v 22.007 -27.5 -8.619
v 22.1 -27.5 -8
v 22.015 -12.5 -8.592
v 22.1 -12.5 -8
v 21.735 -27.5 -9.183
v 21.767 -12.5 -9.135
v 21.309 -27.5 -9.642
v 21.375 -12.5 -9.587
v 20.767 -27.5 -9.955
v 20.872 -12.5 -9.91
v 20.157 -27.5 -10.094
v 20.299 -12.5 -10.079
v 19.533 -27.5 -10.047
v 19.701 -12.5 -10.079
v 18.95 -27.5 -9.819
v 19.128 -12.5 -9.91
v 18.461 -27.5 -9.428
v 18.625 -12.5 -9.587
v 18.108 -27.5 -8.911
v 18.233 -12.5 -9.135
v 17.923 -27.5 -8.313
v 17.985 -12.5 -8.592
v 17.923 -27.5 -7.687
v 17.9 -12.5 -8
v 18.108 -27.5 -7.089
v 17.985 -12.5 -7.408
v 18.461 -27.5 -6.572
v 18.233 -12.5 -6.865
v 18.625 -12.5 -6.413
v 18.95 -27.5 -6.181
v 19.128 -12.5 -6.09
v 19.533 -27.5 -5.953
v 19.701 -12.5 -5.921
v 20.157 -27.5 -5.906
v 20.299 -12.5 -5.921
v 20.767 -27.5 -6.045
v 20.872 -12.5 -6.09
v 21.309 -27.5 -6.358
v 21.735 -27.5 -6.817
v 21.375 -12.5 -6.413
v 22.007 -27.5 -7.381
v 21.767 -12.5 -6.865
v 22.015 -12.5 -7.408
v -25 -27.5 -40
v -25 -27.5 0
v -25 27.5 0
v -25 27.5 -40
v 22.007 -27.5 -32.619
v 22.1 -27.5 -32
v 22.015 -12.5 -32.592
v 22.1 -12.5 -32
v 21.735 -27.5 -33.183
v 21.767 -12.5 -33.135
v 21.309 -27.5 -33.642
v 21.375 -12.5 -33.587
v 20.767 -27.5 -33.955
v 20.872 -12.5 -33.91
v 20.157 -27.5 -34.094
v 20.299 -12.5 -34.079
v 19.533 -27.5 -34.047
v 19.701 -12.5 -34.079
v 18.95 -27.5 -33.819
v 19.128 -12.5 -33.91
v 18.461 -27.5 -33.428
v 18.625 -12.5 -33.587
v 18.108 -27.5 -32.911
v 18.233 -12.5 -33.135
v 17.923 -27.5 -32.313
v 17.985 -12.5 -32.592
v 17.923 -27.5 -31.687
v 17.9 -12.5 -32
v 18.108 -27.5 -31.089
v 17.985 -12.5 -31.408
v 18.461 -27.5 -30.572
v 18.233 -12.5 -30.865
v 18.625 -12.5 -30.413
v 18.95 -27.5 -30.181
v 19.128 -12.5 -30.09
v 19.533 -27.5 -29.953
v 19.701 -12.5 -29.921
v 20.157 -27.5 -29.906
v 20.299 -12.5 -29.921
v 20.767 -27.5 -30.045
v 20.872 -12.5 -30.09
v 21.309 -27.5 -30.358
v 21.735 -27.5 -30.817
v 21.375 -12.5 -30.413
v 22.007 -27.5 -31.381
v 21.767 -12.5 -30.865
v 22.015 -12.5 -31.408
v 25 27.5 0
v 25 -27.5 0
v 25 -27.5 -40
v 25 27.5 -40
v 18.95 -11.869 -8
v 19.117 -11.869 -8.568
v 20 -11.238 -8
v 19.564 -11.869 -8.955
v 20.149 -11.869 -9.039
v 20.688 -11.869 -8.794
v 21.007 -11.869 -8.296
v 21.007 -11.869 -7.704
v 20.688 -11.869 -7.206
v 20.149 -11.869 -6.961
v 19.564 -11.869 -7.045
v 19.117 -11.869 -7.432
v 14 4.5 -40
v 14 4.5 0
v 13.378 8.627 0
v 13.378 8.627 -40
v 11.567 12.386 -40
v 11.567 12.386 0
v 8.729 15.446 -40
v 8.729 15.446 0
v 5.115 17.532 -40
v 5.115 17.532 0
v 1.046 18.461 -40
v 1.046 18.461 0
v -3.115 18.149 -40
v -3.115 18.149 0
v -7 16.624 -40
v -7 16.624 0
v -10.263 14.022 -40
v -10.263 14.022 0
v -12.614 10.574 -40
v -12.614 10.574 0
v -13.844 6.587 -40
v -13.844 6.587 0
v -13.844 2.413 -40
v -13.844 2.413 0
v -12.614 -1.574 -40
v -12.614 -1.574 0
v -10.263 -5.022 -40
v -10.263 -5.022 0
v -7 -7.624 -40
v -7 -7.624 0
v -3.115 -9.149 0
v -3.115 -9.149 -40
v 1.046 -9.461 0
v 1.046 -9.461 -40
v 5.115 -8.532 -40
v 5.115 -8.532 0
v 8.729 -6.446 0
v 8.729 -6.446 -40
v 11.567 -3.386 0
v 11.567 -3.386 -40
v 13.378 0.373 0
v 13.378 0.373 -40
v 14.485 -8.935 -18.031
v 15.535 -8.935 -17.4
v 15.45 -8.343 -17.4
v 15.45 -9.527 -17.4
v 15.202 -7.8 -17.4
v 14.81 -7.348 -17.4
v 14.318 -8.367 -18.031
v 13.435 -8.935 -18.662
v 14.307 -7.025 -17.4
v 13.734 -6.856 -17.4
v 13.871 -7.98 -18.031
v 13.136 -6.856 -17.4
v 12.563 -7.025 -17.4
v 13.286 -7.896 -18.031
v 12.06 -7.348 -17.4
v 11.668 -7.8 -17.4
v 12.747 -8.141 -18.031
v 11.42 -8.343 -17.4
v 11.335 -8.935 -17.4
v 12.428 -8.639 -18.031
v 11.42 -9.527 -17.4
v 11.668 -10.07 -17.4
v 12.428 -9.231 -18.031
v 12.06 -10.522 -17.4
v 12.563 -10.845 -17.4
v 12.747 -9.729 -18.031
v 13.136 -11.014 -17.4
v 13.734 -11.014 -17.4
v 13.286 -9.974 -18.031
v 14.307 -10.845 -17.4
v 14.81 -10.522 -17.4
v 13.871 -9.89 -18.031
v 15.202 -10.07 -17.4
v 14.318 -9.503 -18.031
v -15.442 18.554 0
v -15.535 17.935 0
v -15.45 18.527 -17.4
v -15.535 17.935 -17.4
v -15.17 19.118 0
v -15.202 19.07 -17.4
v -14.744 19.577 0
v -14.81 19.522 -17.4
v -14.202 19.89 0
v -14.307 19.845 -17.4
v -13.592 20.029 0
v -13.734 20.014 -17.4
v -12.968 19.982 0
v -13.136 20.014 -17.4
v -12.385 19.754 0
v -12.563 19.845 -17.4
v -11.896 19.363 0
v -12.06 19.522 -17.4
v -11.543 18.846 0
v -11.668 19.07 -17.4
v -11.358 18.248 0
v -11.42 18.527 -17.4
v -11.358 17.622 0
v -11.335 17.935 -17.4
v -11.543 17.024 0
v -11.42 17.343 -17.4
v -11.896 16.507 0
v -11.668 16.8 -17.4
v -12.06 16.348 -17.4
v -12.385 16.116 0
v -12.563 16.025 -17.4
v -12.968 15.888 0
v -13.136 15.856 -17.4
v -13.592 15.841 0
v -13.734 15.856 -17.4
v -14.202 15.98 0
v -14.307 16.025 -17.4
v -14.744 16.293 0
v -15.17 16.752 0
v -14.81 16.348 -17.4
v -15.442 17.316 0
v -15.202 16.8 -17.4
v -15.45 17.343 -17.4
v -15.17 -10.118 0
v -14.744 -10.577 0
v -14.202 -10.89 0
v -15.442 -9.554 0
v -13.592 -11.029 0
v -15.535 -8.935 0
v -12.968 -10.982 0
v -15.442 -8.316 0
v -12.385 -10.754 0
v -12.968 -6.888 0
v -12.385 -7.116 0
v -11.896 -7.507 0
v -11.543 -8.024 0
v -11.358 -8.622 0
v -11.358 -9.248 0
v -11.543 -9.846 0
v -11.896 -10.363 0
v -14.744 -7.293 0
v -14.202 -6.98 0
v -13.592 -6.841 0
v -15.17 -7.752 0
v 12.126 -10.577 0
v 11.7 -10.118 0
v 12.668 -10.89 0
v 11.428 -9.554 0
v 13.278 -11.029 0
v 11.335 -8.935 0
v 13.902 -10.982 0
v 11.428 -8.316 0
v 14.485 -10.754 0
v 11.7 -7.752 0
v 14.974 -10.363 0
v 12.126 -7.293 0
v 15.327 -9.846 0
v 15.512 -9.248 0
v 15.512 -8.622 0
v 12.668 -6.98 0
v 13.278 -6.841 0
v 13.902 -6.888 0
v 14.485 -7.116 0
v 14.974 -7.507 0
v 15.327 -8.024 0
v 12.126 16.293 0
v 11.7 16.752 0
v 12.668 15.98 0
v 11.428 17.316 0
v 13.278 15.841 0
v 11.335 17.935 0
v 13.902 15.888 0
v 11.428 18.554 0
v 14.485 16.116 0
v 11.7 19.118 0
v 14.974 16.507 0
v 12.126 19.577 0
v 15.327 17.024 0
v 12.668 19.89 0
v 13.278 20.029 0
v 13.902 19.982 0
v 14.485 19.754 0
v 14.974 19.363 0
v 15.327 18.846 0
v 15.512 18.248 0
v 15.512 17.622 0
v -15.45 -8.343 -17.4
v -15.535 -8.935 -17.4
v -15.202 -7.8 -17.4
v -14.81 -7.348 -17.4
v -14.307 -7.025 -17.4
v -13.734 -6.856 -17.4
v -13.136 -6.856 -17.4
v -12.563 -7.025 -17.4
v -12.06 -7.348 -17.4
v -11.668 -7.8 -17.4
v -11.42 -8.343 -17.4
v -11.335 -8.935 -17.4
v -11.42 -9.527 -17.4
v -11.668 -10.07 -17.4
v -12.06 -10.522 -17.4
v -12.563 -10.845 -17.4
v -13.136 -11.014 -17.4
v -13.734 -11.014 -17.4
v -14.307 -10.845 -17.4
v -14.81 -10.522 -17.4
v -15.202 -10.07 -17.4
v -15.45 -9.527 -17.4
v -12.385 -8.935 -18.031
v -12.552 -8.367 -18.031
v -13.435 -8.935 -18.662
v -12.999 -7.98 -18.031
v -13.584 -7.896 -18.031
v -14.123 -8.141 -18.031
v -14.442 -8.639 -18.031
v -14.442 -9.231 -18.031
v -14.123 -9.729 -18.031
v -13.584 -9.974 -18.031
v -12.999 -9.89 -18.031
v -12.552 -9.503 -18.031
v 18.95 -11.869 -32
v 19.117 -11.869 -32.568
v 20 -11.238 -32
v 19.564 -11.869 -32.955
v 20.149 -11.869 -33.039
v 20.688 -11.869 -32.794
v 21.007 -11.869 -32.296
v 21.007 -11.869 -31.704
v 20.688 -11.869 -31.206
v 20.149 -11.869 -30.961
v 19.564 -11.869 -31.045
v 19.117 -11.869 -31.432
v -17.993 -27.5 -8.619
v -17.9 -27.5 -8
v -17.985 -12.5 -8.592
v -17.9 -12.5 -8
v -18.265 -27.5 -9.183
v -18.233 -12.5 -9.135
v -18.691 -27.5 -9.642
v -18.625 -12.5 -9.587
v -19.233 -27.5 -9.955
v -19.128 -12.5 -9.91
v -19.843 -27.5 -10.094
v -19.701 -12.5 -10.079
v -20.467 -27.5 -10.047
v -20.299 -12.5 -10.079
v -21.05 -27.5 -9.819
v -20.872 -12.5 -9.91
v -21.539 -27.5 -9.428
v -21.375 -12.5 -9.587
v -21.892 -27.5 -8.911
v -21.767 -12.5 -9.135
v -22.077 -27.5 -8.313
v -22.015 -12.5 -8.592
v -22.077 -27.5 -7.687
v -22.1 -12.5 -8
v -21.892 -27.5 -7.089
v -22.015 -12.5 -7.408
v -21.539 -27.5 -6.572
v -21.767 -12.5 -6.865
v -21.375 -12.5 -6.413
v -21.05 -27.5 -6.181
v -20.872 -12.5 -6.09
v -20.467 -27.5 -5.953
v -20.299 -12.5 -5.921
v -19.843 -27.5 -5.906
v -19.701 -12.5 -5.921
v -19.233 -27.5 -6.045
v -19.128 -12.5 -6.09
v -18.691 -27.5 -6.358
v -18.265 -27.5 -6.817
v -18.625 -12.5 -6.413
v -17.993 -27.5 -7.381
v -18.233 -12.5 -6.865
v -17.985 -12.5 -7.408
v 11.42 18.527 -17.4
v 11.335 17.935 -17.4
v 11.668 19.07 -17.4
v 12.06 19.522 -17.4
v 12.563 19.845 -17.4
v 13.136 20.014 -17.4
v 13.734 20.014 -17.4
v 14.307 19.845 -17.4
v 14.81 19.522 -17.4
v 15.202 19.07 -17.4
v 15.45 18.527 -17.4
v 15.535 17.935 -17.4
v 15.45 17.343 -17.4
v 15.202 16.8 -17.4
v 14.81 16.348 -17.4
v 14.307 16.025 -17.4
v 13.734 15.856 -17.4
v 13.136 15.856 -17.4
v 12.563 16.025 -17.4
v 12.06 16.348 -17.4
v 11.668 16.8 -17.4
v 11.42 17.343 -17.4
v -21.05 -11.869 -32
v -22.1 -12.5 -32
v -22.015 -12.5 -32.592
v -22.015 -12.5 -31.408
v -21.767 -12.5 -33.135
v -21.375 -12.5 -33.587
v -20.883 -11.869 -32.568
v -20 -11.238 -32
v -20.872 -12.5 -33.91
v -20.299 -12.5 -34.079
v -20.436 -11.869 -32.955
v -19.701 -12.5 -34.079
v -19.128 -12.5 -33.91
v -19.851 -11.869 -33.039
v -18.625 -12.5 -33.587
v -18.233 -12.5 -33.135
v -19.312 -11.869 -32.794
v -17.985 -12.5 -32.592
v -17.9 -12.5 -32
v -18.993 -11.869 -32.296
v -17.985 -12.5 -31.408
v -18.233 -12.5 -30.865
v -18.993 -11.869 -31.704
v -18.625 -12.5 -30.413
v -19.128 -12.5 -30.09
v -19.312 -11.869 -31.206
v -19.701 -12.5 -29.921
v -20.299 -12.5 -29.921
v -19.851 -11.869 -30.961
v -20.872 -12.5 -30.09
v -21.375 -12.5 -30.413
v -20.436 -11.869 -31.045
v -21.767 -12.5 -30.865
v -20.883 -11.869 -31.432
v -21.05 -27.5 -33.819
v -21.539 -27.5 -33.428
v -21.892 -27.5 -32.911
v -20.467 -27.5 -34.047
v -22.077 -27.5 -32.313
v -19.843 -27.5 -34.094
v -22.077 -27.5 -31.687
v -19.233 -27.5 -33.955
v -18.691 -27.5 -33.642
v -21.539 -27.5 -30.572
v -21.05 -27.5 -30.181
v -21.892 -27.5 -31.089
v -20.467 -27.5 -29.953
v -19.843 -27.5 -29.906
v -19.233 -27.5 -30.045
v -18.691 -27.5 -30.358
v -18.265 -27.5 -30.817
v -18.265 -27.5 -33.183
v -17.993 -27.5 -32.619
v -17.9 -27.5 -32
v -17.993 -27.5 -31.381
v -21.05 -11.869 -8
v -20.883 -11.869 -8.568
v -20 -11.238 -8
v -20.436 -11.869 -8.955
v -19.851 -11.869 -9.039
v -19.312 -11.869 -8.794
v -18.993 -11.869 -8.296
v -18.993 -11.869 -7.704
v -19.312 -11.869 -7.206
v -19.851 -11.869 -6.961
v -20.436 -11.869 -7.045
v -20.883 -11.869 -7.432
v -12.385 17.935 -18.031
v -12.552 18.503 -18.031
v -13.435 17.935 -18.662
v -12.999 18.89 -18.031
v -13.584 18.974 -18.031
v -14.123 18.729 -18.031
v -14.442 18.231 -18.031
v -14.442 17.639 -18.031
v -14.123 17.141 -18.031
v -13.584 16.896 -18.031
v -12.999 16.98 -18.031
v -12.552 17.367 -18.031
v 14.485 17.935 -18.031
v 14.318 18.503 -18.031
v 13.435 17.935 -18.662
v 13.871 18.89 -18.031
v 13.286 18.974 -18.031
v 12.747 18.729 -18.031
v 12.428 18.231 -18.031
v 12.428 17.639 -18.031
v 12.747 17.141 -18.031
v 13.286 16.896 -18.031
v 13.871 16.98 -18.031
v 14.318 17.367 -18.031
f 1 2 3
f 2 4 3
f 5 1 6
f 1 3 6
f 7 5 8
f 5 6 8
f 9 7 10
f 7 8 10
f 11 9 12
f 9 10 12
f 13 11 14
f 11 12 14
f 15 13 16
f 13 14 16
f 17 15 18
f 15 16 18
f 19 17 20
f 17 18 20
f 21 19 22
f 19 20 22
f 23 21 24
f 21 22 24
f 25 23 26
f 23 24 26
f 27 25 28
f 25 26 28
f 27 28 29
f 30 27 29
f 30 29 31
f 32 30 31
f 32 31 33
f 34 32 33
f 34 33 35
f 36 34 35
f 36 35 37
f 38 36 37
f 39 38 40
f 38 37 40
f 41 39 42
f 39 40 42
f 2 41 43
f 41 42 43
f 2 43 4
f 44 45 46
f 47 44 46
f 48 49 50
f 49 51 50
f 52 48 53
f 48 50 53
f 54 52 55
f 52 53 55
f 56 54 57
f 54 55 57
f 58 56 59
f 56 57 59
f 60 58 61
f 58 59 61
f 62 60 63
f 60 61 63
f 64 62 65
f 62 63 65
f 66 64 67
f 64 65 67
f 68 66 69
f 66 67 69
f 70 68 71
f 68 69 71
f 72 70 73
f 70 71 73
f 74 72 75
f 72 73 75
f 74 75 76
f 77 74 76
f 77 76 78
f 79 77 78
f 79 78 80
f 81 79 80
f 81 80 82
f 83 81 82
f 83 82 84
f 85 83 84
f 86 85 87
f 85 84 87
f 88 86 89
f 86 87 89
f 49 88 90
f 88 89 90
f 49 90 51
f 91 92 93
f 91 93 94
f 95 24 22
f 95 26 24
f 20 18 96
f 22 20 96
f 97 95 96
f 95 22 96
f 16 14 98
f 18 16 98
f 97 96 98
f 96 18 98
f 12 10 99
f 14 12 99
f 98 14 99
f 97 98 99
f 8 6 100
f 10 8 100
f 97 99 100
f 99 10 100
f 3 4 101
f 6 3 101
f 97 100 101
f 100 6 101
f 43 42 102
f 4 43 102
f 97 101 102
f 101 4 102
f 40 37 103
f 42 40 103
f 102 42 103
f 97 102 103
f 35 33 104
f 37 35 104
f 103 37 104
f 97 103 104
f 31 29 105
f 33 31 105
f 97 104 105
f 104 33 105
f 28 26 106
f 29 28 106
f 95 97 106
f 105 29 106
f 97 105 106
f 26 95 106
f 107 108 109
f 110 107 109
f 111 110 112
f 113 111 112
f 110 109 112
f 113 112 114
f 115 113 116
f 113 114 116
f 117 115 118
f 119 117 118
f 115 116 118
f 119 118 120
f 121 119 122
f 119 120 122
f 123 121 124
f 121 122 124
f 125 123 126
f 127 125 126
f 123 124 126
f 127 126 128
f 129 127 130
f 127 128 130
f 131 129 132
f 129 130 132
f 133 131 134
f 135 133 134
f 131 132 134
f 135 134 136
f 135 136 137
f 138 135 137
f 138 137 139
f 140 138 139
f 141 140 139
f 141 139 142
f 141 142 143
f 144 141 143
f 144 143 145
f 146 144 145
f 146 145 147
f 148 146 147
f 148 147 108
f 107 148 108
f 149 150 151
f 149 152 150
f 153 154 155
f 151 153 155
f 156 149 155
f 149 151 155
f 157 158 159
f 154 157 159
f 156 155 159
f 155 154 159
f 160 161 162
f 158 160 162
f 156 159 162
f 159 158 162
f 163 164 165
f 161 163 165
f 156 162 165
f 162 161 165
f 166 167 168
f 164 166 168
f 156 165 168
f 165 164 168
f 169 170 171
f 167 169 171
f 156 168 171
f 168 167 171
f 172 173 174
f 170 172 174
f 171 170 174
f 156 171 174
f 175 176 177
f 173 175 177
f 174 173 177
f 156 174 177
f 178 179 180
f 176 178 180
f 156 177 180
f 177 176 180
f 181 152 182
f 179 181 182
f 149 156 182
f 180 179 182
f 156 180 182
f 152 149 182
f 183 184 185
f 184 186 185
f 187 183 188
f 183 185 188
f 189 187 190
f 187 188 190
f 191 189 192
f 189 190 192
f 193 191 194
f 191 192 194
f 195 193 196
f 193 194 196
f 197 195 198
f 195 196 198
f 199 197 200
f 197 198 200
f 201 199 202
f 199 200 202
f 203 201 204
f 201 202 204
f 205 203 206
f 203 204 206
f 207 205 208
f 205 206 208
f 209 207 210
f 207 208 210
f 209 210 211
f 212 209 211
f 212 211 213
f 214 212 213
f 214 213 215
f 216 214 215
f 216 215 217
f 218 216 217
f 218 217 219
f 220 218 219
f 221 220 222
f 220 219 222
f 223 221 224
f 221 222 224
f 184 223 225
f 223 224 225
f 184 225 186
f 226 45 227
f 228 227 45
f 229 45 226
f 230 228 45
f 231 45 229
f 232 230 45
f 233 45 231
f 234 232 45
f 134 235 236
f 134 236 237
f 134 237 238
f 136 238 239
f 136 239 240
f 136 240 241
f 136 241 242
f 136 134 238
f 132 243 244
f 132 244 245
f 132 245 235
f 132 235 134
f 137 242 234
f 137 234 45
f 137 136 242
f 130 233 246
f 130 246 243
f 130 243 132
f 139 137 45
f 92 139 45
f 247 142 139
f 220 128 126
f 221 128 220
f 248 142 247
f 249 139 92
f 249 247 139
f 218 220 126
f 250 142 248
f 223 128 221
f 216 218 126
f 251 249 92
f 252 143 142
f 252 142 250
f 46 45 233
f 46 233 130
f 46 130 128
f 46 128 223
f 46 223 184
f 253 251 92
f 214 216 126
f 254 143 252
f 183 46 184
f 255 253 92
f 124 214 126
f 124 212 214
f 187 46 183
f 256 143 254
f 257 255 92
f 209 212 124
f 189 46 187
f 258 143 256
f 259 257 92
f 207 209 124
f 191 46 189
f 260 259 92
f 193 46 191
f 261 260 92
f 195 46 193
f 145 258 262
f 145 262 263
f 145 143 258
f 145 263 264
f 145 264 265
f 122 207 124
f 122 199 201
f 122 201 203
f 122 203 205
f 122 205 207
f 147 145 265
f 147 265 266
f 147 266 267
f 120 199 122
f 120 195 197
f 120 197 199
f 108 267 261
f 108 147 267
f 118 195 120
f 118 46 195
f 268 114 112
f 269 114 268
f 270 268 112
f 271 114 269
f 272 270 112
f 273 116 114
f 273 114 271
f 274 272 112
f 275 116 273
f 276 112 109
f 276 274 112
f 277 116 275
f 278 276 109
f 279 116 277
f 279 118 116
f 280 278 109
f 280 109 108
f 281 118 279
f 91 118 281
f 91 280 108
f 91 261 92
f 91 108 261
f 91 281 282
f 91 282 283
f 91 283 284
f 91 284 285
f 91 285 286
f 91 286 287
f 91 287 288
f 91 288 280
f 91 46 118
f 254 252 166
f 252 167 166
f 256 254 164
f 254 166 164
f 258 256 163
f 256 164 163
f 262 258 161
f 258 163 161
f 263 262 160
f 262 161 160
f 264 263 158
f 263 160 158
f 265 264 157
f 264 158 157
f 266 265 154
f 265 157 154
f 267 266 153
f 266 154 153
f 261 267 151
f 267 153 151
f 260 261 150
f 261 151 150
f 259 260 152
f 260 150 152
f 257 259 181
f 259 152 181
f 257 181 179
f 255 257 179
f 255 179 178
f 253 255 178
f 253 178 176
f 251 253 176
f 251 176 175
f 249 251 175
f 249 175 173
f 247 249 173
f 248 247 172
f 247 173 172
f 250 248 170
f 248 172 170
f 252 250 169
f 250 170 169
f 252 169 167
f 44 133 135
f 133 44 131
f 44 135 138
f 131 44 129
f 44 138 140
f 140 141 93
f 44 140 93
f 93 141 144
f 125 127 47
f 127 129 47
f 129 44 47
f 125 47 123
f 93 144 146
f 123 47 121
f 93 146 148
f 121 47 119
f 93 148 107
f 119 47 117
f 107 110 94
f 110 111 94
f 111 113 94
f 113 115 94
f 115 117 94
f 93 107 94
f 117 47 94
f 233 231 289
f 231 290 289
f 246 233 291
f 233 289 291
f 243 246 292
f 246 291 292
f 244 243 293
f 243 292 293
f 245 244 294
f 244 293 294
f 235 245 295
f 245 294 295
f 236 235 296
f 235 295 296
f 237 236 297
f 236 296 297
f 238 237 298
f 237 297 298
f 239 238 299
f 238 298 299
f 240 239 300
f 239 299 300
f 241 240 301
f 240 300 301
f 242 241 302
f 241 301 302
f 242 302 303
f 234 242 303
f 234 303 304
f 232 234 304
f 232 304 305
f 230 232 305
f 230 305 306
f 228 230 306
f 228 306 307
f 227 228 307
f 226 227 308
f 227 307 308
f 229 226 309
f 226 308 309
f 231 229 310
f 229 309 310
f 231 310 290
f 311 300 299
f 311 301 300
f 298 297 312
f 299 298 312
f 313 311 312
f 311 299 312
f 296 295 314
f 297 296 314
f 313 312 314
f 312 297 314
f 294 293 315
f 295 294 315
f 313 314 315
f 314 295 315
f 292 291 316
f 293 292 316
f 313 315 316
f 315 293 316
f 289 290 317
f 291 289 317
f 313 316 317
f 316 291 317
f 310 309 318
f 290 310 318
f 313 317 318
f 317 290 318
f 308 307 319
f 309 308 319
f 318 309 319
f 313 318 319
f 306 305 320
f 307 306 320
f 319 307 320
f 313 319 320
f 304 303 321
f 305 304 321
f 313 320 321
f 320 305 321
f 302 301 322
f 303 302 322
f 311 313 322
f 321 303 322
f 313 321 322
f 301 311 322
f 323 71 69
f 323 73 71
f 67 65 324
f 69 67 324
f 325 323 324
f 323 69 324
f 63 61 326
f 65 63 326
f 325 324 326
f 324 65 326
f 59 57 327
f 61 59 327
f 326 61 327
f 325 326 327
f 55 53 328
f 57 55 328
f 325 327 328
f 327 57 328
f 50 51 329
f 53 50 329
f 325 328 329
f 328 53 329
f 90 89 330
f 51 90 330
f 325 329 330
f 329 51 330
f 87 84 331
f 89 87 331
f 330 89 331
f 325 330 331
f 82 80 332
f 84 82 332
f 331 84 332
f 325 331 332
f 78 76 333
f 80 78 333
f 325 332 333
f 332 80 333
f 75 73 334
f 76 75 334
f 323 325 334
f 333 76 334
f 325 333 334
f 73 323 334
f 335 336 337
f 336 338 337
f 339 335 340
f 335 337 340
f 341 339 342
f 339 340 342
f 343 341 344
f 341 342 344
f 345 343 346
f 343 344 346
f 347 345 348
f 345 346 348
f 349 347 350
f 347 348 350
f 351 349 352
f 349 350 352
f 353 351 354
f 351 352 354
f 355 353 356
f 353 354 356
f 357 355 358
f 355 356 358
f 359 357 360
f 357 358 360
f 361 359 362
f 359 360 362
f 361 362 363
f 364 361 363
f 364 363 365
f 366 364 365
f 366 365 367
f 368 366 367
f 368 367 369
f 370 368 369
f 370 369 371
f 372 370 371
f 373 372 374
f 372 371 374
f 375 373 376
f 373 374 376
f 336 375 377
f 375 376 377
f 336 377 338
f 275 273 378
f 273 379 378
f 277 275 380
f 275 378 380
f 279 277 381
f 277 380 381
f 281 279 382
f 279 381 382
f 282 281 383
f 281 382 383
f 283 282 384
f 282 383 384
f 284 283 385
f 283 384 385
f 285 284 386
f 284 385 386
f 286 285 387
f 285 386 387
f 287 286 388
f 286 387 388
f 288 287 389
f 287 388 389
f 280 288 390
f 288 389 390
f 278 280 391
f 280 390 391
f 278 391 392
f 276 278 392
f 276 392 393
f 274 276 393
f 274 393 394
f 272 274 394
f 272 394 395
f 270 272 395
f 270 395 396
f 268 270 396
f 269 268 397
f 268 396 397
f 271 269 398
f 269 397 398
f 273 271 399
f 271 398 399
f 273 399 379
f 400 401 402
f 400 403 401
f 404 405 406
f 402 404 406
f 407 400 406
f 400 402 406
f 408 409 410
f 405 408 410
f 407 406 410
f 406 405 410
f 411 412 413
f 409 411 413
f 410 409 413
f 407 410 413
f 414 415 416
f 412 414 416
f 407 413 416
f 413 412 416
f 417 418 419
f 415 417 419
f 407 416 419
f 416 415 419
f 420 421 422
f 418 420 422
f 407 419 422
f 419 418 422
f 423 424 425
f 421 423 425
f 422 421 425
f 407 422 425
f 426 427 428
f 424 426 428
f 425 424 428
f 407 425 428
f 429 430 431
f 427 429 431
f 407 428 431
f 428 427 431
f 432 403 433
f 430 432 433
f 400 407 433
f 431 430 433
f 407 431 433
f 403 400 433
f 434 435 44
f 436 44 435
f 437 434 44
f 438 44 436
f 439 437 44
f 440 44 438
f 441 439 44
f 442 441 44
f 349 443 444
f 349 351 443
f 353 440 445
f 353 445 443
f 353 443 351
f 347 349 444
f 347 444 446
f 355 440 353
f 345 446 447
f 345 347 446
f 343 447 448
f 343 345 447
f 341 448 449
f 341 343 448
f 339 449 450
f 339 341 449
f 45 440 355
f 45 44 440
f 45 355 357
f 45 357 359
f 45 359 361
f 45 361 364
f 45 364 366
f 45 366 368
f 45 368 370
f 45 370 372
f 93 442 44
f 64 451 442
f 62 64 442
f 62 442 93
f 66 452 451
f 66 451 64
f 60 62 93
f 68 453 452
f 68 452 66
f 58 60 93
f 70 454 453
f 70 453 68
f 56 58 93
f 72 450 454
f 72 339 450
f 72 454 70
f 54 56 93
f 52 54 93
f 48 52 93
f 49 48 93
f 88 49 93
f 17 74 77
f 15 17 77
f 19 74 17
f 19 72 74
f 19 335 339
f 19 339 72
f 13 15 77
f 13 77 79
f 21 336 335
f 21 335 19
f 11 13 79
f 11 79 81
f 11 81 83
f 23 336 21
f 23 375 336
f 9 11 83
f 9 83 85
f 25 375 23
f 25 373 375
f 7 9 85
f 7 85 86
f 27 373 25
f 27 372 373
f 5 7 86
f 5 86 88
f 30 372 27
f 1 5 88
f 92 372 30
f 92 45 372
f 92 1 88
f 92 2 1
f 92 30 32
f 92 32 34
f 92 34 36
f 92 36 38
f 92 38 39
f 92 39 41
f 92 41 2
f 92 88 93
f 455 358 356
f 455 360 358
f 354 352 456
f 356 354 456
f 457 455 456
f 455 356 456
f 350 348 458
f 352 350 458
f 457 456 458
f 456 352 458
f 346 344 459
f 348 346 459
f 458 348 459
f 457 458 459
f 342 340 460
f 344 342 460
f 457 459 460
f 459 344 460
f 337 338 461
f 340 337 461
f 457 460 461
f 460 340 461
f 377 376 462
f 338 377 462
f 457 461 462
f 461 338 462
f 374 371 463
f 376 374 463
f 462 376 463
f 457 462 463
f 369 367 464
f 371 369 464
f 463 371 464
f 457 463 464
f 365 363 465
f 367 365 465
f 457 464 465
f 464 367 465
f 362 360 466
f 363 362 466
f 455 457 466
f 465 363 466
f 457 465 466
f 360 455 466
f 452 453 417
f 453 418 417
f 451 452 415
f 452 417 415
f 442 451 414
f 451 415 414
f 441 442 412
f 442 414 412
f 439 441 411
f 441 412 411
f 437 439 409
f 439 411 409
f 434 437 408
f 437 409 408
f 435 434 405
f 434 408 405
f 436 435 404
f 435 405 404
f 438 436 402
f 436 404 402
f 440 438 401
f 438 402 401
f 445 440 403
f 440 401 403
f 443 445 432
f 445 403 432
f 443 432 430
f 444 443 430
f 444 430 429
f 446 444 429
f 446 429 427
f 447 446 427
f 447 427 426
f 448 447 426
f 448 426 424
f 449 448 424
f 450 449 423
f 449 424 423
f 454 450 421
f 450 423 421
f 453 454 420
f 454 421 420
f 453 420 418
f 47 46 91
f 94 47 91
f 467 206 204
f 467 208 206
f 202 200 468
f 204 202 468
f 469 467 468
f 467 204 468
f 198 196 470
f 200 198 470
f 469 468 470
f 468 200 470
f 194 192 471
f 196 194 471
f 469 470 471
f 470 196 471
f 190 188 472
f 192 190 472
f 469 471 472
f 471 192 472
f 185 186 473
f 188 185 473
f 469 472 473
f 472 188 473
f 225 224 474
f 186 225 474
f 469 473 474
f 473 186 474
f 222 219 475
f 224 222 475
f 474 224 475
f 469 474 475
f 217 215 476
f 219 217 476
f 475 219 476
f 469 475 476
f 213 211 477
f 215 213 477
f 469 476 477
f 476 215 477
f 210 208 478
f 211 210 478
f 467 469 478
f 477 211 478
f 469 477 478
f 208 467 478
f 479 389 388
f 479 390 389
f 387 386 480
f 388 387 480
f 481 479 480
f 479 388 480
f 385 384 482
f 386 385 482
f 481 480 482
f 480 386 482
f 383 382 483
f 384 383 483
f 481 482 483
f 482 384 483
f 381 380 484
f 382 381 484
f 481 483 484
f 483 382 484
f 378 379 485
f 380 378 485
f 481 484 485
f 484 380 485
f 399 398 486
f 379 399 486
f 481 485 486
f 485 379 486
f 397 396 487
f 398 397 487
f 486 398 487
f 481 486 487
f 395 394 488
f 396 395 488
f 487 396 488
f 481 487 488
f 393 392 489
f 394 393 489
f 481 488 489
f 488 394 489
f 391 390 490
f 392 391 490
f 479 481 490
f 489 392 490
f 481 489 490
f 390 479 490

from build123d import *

# Parameters (mm, degrees)
SKETCH1_W             = 50
SKETCH1_H             = 55
BOSS_EXTRUDE1_DEPTH   = 40
SKETCH2_R             = 14
CUT_EXTRUDE1_DEPTH    = 55.60082417
M5_TAPPED_HOLE1_D     = 4.2
M5_TAPPED_HOLE1_DEPTH = 15
M5_TAPPED_HOLE1_TIP   = 1.2618073
M5_TAPPED_HOLE3_D     = 4.2
M5_TAPPED_HOLE3_DEPTH = 17.4
M5_TAPPED_HOLE3_TIP   = 1.2618073


with BuildPart() as part:
    # Sketch1 → Boss-Extrude1 (new body)
    with BuildSketch(Plane.XY):
        Rectangle(SKETCH1_W, SKETCH1_H)
    extrude(amount=-BOSS_EXTRUDE1_DEPTH)

    # Sketch2 → Cut-Extrude1 (cut, through all)
    with BuildSketch(Plane.XY):
        with Locations((0, 4.5)):
            Circle(SKETCH2_R)
    extrude(amount=-CUT_EXTRUDE1_DEPTH, mode=Mode.SUBTRACT)

    # M5 Tapped Hole1
    with Locations(Plane(origin=(-20, -27.5, -8), x_dir=(-1, 0, 0), z_dir=(0, -1, 0))):
        with Locations((0, 0), (-40, 0), (-40, 24), (0, 24)):
            Hole(M5_TAPPED_HOLE1_D / 2, depth=M5_TAPPED_HOLE1_DEPTH)
            with Locations((0, 0, -(M5_TAPPED_HOLE1_DEPTH + M5_TAPPED_HOLE1_TIP / 2))):  # 118° drill point
                Cone(0, M5_TAPPED_HOLE1_D / 2, M5_TAPPED_HOLE1_TIP, mode=Mode.SUBTRACT)

    # M5 Tapped Hole3
    with Locations(Plane(origin=(13.435028843, 17.935028843, 0), x_dir=(1, 0, 0), z_dir=(0, 0, 1))):
        with Locations((0, 0), (0, -26.870057686), (-26.870057686, -26.870057686), (-26.870057686, 0)):
            Hole(M5_TAPPED_HOLE3_D / 2, depth=M5_TAPPED_HOLE3_DEPTH)
            with Locations((0, 0, -(M5_TAPPED_HOLE3_DEPTH + M5_TAPPED_HOLE3_TIP / 2))):  # 118° drill point
                Cone(0, M5_TAPPED_HOLE3_D / 2, M5_TAPPED_HOLE3_TIP, mode=Mode.SUBTRACT)


solid = part.part
